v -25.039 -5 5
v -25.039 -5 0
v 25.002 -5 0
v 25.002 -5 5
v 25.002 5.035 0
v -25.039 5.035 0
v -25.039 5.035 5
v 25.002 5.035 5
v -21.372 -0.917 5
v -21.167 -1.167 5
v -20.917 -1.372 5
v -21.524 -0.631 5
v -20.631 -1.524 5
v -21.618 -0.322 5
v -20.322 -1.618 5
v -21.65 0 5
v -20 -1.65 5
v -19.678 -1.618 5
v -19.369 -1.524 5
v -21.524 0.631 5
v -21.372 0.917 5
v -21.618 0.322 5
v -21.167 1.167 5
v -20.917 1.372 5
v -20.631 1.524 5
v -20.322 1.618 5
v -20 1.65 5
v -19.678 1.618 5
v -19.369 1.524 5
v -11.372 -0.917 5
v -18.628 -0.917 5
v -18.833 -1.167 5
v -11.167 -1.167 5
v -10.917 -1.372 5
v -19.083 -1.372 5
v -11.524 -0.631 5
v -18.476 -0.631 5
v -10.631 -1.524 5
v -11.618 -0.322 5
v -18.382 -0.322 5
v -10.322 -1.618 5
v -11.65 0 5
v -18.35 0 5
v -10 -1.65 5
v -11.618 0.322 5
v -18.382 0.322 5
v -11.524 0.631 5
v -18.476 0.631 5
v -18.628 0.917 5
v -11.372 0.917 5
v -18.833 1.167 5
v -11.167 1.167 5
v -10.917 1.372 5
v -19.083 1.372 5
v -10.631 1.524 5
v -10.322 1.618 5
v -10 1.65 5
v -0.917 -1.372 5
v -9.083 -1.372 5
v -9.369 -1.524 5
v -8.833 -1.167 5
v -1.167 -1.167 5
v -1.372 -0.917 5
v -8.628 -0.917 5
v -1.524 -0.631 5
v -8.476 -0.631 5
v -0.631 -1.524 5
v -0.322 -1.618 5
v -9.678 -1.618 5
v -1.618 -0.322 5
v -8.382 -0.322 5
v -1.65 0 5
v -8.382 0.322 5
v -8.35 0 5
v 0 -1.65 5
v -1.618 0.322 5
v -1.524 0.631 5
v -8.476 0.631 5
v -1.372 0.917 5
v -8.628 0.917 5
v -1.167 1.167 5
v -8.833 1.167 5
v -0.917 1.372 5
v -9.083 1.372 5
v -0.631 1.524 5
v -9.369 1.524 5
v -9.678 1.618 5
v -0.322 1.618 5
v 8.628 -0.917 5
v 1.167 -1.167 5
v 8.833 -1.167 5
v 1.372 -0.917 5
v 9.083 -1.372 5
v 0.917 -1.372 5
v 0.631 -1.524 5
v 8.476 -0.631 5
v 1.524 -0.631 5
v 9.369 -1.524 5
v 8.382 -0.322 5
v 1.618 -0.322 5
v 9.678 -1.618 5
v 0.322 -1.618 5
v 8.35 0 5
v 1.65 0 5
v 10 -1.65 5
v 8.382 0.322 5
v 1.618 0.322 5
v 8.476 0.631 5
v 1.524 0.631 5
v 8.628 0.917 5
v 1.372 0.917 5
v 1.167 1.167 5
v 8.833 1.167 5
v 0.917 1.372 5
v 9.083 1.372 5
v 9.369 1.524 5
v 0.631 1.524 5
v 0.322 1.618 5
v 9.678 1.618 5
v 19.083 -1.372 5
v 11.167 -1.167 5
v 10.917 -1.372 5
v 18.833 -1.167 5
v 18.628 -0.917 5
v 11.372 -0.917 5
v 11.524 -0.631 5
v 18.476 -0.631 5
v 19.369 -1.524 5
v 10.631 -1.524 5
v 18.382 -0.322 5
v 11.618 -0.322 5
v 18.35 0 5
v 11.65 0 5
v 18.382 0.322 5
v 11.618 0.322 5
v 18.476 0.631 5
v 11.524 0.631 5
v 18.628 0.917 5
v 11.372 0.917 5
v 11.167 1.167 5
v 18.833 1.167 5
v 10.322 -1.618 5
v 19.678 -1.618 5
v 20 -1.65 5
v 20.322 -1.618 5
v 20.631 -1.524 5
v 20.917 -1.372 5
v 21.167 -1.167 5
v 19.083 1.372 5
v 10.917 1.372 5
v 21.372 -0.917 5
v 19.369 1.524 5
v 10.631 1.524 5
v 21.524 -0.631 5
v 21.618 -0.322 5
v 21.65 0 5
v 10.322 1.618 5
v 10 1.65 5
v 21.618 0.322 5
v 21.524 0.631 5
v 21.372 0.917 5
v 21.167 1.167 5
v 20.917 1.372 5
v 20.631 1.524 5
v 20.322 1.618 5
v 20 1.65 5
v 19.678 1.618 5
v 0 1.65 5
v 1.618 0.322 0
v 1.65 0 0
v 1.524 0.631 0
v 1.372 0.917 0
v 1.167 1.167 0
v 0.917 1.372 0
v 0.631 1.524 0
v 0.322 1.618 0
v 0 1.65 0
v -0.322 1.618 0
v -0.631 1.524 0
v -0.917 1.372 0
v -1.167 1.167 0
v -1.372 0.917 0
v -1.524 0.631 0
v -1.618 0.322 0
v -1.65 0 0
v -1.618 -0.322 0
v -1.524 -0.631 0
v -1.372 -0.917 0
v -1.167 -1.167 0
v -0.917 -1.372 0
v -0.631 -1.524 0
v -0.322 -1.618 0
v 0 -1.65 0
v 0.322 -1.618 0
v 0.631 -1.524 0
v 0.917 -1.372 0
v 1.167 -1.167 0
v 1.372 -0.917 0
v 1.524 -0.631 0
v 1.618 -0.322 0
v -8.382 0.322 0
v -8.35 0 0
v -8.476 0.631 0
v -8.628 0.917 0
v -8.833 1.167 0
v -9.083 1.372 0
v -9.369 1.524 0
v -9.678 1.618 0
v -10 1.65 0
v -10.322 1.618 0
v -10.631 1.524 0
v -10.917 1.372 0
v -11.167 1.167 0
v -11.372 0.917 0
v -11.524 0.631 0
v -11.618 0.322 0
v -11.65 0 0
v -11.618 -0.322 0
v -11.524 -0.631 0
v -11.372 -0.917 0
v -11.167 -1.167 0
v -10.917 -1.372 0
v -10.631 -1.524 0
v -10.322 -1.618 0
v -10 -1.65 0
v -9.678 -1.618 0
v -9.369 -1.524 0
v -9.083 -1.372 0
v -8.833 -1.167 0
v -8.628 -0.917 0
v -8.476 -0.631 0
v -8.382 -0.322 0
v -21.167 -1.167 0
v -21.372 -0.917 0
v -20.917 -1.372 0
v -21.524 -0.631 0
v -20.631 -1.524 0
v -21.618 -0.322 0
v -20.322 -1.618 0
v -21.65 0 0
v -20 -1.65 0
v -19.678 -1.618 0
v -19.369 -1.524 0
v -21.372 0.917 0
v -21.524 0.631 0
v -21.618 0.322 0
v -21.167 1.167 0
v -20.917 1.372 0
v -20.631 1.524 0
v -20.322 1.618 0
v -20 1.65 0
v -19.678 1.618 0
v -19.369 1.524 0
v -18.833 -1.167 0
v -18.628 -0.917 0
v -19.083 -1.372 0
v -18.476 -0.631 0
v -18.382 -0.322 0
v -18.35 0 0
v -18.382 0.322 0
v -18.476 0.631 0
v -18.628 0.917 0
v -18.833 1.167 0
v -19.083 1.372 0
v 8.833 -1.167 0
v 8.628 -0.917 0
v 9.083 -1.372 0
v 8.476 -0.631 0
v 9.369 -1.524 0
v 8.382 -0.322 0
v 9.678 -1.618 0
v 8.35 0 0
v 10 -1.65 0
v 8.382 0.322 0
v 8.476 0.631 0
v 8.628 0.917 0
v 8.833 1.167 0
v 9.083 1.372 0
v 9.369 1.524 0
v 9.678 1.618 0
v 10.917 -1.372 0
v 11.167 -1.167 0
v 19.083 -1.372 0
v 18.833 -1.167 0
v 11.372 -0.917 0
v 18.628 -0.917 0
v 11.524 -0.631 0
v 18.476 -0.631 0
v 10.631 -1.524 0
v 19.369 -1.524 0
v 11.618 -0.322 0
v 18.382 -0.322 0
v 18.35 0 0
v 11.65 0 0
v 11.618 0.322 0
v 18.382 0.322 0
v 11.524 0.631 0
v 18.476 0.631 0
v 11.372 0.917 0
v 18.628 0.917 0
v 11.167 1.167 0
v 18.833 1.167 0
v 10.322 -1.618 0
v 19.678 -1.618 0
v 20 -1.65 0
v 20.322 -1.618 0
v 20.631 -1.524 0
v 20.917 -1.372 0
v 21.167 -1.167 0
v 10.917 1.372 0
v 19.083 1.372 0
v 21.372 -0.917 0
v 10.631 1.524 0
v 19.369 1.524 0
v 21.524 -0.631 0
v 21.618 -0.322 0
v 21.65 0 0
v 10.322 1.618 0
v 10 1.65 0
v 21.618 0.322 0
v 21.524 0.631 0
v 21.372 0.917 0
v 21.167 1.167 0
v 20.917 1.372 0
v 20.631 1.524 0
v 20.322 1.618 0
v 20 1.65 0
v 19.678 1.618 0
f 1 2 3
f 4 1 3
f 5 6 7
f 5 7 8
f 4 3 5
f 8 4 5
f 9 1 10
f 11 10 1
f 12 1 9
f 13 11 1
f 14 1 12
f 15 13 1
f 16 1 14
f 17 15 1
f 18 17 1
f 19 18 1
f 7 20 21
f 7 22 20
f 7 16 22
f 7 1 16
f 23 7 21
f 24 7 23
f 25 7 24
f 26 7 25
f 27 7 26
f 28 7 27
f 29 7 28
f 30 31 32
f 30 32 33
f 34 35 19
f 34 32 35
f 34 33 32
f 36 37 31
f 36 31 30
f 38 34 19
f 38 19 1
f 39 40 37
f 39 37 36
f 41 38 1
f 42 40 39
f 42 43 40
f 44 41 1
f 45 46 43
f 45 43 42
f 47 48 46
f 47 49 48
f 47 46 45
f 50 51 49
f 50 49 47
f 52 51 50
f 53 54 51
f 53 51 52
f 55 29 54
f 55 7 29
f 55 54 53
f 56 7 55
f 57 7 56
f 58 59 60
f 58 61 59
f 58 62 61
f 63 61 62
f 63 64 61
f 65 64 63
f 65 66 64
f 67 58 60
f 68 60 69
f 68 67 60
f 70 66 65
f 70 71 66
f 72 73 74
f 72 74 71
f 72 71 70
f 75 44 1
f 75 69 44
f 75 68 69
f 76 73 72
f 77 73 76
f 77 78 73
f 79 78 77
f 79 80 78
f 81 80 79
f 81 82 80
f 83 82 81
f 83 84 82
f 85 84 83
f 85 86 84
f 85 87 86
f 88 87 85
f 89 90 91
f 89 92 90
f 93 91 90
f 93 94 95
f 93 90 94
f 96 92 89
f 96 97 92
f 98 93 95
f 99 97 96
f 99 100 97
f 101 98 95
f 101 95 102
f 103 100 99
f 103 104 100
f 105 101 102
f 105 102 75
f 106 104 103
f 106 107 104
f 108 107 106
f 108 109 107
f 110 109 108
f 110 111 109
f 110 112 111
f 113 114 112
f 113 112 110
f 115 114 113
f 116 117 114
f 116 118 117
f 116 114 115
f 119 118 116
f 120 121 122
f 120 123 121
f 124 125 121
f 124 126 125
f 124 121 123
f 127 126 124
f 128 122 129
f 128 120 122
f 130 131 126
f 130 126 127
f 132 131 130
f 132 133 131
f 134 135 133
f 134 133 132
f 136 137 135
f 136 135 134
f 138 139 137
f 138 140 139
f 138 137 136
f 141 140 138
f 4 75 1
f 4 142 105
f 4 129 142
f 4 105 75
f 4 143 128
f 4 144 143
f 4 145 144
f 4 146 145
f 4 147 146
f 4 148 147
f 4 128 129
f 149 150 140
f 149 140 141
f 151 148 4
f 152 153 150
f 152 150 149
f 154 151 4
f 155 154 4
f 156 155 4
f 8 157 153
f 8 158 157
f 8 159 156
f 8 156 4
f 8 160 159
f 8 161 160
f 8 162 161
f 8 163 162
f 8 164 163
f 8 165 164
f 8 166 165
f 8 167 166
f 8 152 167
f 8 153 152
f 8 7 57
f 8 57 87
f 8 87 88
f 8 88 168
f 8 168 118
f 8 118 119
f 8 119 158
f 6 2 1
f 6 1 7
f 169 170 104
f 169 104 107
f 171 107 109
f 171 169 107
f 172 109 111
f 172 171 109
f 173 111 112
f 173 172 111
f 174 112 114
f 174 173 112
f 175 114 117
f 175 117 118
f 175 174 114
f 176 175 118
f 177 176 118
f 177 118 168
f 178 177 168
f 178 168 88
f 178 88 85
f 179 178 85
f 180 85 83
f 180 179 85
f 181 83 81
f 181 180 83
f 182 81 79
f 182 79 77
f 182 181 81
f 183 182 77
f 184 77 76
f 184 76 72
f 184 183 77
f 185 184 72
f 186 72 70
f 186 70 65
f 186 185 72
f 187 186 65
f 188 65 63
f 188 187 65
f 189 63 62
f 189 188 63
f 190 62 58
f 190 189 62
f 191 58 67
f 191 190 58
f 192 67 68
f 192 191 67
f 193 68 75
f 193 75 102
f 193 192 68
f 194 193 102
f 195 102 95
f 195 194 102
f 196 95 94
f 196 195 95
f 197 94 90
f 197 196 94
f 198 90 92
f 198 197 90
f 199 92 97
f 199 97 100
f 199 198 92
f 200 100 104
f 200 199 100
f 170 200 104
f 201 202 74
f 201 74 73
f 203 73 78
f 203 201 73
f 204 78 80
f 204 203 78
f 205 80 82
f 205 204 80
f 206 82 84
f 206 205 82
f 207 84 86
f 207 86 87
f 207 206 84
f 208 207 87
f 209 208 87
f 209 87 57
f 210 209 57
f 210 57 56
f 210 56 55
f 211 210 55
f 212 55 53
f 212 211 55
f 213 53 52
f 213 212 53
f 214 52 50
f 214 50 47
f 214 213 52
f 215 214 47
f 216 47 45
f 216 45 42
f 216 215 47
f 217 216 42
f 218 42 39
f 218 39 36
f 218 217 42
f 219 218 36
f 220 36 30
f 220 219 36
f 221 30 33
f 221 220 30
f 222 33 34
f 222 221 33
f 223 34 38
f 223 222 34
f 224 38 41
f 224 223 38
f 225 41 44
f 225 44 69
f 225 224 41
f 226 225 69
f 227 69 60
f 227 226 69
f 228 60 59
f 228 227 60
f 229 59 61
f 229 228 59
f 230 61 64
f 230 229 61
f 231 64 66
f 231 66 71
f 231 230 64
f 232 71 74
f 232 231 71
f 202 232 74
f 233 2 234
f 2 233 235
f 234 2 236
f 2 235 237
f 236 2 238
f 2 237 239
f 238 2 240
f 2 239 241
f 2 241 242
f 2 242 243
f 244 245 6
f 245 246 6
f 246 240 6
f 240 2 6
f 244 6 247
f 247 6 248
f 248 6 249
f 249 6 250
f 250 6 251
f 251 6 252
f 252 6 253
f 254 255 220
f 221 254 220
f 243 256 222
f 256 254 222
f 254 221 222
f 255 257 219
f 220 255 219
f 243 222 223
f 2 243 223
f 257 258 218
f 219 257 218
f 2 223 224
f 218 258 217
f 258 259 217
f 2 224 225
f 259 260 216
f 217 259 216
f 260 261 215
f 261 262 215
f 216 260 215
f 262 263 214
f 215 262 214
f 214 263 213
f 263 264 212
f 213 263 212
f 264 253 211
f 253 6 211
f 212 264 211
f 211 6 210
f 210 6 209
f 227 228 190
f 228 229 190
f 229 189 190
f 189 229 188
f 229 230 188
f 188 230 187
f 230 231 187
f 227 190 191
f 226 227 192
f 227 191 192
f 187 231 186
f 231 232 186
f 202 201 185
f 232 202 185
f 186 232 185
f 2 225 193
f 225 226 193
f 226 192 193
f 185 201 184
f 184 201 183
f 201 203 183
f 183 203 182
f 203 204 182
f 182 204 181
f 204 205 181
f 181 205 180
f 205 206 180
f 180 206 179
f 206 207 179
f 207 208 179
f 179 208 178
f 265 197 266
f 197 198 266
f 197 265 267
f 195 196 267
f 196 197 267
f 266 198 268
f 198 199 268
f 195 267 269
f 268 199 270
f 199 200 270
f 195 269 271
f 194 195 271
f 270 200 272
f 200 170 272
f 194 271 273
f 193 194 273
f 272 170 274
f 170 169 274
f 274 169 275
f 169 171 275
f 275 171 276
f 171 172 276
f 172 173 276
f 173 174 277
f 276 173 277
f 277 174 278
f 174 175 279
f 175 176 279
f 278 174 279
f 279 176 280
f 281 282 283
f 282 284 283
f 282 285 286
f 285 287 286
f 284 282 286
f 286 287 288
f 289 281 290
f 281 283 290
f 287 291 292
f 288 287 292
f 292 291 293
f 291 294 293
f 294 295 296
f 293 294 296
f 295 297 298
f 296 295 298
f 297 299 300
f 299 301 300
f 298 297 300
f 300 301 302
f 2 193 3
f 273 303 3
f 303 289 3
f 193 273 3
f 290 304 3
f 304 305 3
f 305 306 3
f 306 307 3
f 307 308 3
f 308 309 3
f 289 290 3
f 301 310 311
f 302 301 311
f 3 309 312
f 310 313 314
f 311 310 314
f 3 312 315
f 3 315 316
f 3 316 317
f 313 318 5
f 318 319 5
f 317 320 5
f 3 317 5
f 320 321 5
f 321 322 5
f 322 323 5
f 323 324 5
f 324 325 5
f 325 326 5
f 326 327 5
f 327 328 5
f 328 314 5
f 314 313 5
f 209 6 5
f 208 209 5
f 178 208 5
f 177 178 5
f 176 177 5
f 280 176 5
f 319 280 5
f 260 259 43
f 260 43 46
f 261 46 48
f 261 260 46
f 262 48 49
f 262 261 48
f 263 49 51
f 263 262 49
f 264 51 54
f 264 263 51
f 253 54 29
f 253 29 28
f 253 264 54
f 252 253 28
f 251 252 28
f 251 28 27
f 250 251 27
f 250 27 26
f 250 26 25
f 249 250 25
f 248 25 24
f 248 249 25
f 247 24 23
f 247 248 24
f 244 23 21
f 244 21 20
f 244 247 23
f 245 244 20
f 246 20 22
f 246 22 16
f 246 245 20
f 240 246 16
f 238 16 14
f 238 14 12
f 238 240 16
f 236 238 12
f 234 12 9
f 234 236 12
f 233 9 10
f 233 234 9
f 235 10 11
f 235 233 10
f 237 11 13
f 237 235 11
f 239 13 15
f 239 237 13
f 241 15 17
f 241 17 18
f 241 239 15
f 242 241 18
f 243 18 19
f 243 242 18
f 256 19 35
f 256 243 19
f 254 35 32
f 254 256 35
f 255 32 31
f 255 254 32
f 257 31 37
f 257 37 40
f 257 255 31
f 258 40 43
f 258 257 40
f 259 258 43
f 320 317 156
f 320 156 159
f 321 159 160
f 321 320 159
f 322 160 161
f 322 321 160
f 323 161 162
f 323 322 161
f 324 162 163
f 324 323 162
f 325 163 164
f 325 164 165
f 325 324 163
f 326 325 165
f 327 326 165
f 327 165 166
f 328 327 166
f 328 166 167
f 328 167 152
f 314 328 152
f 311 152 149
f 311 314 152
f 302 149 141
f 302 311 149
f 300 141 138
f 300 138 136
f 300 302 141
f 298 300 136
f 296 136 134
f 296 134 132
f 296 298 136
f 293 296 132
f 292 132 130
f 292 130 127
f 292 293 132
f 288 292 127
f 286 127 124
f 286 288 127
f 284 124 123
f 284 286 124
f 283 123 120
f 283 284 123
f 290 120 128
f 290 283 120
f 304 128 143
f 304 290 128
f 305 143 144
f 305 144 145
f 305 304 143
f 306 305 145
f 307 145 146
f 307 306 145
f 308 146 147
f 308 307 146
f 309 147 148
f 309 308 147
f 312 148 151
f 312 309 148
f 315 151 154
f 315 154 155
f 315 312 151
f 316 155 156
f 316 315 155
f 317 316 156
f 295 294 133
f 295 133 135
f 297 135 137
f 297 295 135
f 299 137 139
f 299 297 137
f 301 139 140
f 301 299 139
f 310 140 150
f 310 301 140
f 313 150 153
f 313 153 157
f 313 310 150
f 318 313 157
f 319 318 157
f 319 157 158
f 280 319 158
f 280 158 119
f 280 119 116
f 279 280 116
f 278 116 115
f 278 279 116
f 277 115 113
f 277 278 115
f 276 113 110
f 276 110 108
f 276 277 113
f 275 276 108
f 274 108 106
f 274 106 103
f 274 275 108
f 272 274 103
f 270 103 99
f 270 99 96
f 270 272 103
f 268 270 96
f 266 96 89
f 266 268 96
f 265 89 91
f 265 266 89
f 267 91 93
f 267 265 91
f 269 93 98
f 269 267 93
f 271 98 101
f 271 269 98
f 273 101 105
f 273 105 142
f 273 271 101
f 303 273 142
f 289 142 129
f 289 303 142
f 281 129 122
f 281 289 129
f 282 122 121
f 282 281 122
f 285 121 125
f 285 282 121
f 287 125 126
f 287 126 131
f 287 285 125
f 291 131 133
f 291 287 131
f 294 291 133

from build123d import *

# Parameters (mm, degrees)
SKETCH_R         = 1.65
EXTRUDE_DEPTH    = 5
SKETCH001_W      = 50.041317
SKETCH001_H      = 10.034617
EXTRUDE001_DEPTH = 5


with BuildPart() as extrude_body:
    # Sketch → Extrude (new body)
    with BuildSketch(Plane.XY):
        Circle(SKETCH_R)
        with Locations((-10, 0)):
            Circle(SKETCH_R)
        with Locations((-20, 0)):
            Circle(SKETCH_R)
        with Locations((10, 0)):
            Circle(SKETCH_R)
        with Locations((20, 0)):
            Circle(SKETCH_R)
    extrude(amount=EXTRUDE_DEPTH)


with BuildPart() as cut:
    # Sketch001 → Extrude001 (new body)
    with BuildSketch(Plane.XY):
        with Locations((-0.018242, 0.017349)):
            Rectangle(SKETCH001_W, SKETCH001_H)
    extrude(amount=EXTRUDE001_DEPTH)

    # Cut: cut Extrude body
    add(extrude_body.part, mode=Mode.SUBTRACT)


solid = cut.part
